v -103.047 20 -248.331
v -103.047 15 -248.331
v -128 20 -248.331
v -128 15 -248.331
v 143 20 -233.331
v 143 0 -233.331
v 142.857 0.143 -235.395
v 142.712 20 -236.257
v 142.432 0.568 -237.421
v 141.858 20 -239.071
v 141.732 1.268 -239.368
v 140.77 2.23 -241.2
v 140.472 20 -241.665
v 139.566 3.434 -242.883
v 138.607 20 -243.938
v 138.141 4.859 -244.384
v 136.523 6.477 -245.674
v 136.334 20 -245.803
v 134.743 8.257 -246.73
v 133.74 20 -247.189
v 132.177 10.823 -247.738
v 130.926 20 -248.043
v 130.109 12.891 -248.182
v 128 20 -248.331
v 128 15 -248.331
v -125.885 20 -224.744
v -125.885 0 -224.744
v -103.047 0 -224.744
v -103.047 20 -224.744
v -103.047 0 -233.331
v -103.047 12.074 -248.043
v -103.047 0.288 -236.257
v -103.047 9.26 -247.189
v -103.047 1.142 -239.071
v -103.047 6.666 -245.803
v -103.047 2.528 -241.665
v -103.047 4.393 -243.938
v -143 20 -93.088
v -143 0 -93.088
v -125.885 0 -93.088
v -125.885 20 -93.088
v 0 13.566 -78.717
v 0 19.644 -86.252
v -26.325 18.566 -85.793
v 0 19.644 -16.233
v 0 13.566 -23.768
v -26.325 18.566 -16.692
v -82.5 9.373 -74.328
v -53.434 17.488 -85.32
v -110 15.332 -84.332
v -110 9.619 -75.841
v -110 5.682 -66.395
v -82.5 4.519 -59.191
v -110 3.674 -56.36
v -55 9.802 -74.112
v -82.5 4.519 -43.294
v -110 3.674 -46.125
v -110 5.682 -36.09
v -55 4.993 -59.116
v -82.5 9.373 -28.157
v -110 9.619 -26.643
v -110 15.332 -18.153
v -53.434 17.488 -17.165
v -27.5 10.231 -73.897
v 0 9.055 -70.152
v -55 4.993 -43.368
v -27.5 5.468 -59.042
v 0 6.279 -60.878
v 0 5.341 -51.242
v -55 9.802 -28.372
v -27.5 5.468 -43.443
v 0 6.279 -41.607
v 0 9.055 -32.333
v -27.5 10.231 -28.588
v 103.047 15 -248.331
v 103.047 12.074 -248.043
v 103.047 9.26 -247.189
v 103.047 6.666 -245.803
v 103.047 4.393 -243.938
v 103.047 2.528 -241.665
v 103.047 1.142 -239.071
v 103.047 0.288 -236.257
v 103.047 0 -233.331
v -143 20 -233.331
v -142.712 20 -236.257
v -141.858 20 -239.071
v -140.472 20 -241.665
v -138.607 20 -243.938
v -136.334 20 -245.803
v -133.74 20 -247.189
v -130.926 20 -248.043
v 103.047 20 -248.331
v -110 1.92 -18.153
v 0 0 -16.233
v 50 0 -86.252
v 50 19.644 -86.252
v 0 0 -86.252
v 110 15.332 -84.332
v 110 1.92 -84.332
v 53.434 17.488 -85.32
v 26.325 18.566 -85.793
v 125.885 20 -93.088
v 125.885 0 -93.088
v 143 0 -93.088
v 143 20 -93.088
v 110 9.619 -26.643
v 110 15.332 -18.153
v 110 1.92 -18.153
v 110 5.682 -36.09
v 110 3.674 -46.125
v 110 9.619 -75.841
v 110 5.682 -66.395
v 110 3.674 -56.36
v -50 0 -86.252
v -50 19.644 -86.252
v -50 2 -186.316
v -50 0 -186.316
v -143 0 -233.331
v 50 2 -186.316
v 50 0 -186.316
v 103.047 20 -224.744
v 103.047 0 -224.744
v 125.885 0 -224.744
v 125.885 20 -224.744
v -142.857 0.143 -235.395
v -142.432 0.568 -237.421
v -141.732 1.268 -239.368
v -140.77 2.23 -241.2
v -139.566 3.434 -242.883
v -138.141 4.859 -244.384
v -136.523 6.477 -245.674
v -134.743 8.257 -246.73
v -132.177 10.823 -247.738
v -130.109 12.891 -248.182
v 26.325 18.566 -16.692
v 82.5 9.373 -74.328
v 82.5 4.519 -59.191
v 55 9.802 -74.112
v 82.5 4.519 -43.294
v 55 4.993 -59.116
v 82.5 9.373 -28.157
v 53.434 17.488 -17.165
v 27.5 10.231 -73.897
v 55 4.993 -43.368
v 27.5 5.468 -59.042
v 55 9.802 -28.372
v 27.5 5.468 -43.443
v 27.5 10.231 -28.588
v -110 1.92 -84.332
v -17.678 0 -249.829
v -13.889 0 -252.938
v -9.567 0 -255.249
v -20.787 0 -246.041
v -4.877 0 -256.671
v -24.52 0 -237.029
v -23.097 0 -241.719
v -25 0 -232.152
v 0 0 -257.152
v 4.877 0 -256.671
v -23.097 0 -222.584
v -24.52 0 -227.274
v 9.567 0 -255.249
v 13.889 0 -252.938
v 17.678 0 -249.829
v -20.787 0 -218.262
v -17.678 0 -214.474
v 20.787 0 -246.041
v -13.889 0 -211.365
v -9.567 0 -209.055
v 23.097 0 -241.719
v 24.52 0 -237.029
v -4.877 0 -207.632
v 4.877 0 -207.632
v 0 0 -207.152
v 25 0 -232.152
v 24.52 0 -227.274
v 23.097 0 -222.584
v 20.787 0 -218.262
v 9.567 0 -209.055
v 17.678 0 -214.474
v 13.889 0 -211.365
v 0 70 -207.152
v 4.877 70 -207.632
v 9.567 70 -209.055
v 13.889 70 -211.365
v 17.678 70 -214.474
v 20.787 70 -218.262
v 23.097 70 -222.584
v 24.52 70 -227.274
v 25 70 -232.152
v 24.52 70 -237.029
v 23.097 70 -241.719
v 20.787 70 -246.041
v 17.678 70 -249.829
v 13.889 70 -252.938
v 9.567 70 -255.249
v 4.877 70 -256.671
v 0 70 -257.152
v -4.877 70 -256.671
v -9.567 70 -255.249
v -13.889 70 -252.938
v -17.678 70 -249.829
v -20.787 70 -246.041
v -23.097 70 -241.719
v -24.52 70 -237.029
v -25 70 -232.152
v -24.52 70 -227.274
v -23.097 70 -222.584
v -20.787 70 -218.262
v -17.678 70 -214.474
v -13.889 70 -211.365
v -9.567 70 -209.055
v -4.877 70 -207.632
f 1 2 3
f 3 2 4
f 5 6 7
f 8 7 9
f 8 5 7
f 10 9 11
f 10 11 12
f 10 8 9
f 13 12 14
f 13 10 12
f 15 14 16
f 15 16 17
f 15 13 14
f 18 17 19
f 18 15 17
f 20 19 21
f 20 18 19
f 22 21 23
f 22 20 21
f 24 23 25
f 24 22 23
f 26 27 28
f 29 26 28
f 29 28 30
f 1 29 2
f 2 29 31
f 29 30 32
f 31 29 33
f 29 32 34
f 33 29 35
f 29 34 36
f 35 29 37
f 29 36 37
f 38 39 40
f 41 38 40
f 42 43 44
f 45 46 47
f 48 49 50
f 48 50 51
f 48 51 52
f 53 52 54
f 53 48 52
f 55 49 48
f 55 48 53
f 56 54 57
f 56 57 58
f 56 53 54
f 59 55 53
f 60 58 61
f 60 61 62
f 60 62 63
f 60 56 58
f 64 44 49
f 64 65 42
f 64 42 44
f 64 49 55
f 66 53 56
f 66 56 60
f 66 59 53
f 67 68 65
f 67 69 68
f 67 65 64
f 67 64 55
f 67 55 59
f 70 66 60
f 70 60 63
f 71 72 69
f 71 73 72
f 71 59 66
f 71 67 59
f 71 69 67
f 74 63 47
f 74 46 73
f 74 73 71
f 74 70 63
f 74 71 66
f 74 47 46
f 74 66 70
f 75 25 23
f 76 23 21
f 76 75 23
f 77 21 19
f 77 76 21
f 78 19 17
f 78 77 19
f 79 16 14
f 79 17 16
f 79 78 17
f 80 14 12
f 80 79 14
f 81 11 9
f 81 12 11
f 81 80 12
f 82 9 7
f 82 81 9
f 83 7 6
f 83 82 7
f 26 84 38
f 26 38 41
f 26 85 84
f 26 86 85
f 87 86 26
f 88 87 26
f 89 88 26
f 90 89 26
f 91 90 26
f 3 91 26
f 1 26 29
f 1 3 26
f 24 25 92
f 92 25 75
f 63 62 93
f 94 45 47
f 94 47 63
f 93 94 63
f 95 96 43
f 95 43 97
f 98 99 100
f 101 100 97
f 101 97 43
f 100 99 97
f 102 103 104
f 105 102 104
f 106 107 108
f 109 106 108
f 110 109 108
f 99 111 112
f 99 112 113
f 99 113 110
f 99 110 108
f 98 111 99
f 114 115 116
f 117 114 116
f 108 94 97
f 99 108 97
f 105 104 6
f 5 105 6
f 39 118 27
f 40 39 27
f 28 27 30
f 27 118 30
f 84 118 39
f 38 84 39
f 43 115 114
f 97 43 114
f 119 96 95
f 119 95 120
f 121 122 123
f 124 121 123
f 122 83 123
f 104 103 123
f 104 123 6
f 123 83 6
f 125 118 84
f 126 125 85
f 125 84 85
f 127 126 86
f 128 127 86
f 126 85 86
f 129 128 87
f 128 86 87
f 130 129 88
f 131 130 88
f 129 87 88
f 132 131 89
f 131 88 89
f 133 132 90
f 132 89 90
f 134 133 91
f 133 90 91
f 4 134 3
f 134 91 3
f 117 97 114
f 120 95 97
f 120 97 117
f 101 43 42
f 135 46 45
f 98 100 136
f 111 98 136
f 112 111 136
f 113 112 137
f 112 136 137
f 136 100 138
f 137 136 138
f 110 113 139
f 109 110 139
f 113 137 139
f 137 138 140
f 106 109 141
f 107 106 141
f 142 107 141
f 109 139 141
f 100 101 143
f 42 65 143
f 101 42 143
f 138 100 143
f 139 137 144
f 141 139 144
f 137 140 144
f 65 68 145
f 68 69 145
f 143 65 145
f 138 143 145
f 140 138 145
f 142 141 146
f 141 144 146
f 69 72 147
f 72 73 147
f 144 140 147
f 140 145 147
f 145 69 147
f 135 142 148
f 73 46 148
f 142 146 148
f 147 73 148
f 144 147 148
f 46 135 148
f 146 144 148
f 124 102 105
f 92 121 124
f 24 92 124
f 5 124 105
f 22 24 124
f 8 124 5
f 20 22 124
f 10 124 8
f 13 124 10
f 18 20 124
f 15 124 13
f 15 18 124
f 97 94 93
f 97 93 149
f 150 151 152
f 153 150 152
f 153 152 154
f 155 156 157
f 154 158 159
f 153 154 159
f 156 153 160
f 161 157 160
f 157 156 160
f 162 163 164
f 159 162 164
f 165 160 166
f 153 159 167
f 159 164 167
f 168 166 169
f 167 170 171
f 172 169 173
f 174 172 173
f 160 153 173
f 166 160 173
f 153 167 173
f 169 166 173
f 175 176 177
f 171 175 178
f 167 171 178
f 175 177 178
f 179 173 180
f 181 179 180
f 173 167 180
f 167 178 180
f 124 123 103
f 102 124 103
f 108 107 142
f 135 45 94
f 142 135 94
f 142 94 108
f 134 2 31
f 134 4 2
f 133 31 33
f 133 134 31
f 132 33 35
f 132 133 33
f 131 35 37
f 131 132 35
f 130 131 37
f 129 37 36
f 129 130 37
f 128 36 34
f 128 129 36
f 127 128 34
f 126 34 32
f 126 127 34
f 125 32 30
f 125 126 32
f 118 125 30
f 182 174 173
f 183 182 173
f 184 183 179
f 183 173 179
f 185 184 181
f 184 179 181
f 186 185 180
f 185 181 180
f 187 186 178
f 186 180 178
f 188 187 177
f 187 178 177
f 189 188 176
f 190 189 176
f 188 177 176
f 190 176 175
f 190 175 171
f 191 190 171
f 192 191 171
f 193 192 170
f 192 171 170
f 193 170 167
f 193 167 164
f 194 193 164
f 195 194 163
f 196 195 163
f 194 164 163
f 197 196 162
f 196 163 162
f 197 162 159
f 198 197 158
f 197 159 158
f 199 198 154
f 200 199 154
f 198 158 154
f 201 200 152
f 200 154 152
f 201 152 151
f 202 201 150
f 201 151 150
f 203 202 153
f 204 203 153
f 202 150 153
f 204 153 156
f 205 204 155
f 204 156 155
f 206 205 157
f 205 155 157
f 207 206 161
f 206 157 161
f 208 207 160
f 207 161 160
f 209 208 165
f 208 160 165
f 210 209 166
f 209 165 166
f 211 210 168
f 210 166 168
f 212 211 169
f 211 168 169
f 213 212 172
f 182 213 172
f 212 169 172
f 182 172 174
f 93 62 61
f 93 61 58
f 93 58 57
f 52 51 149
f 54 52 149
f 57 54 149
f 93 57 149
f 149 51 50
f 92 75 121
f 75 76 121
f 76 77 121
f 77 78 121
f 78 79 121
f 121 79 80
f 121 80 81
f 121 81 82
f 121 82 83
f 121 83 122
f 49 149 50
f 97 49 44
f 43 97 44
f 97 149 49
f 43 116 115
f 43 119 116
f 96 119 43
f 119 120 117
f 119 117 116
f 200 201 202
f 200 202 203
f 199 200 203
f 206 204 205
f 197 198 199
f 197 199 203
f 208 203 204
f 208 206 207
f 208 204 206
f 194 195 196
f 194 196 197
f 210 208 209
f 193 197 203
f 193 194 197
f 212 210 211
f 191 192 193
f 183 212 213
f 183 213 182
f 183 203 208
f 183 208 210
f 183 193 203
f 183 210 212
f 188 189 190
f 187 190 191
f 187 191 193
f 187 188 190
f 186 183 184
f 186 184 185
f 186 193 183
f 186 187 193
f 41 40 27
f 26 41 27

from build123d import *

# Parameters (mm, degrees)
BOSS_EXTRUDE1_DEPTH           = 20
BOSS_EXTRUDE1_2_DEPTH         = 20
FILLET1_R                     = 15
FILLET2_R                     = 15
BOSS_EXTRUDE2_DEPTH           = 50
SKETCH4_R                     = 25
BOSS_EXTRUDE3_DEPTH           = 70
BOSS_EXTRUDE4_DEPTH           = 110
BOSS_EXTRUDE4_DRAFT           = 1
BOSS_EXTRUDE4_OTHER_WAY_DEPTH = 110
BOSS_EXTRUDE4_OTHER_WAY_DRAFT = -1


with BuildPart() as part:
    # Sketch3 → Boss-Extrude1 (new body)
    with BuildSketch(Plane(origin=(0, 0, 0), x_dir=(1, 0, 0), z_dir=(0, 1, 0))):
        Polygon((-143, 248.331026124), (-143, 93.088162206), (-125.885057368, 93.088162206), (-125.885057368, 224.743736792), (-103.047296996, 224.743736792), (-103.047296996, 248.331026124), align=None)
    extrude(amount=BOSS_EXTRUDE1_DEPTH)

    # Fillet1
    fillet1_edges = [part.edges().sort_by_distance(p)[0] for p in [
        (-143, 10, -248.331026124),
        (-123.023648498, 0, -248.331026124),
    ]]
    fillet(fillet1_edges, radius=FILLET1_R)


with BuildPart() as body_2:
    # Sketch3 → Boss-Extrude1 2 (new body)
    with BuildSketch(Plane(origin=(0, 0, 0), x_dir=(1, 0, 0), z_dir=(0, 1, 0))):
        Polygon((125.885057368, 224.743736792), (125.885057368, 93.088162206), (143, 93.088162206), (143, 248.331026124), (103.047296996, 248.331026124), (103.047296996, 224.743736792), align=None)
    extrude(amount=BOSS_EXTRUDE1_2_DEPTH)

    # Fillet2
    fillet2_edges = [body_2.edges().sort_by_distance(p)[0] for p in [
        (143, 10, -248.331026124),
        (123.023648498, 0, -248.331026124),
    ]]
    fillet(fillet2_edges, radius=FILLET2_R)


with BuildPart() as body_3:
    # Sketch5 → Boss-Extrude2 (new, symmetric)
    with BuildSketch(Plane(origin=(0, 0, 0), x_dir=(0, 0, -1), z_dir=(1, 0, 0))):
        Polygon((86.252282078, 19.643991172), (86.252282078, 0), (186.316328437, 0), (186.316328437, 2), align=None)
    extrude(amount=BOSS_EXTRUDE2_DEPTH, both=True)


with BuildPart() as body_4:
    # Sketch4 → Boss-Extrude3 (new body)
    with BuildSketch(Plane(origin=(0, 0, 0), x_dir=(1, 0, 0), z_dir=(0, 1, 0))):
        with Locations(Location((0, 232.151552464, 0), (0, 0, 270))):
            Circle(SKETCH4_R)
    extrude(amount=BOSS_EXTRUDE3_DEPTH)


with BuildPart() as boss_extrude4_tool:
    # Sketch6 → Boss-Extrude4 (with draft: the straight prism first)
    with BuildSketch(Plane(origin=(0, 0, 0), x_dir=(0, 0, -1), z_dir=(1, 0, 0))):
        with BuildLine():
            Line((86.252282078, 0), (86.252282078, 19.643991172))
            ThreePointArc((86.252282078, 19.643991172), (51.24243699, 5.341480536), (16.232591902, 19.643991172))
            Line((16.232591902, 19.643991172), (16.232591902, 0))
            Line((16.232591902, 0), (86.252282078, 0))
        make_face()
    extrude(amount=BOSS_EXTRUDE4_DEPTH)
    # Boss-Extrude4: the draft: its side faces are tilted about the plane it starts from
    boss_extrude4_sides = [boss_extrude4_tool.faces().sort_by_distance(p)[0] for p in [
        (55, 9.821995586, -86.252282078),
        (55, 5.341480536, -51.24243699),
        (55, 9.821995586, -16.232591902),
        (55, 0, -51.24243699),
    ]]
    draft(boss_extrude4_sides, Plane(origin=(0, 0, 0), x_dir=(0, 0, -1), z_dir=(1, 0, 0)), BOSS_EXTRUDE4_DRAFT)


with BuildPart() as body_3_1:
    add(body_3.part)

    # Boss-Extrude4: add boss_extrude4_tool
    add(boss_extrude4_tool.part)


with BuildPart() as boss_extrude4_other_way_tool:
    # Sketch6 → Boss-Extrude4 other way (with draft: the straight prism first)
    with BuildSketch(Plane(origin=(0, 0, 0), x_dir=(0, 0, -1), z_dir=(1, 0, 0))):
        with BuildLine():
            Line((86.252282078, 0), (86.252282078, 19.643991172))
            ThreePointArc((86.252282078, 19.643991172), (51.24243699, 5.341480536), (16.232591902, 19.643991172))
            Line((16.232591902, 19.643991172), (16.232591902, 0))
            Line((16.232591902, 0), (86.252282078, 0))
        make_face()
    extrude(amount=-BOSS_EXTRUDE4_OTHER_WAY_DEPTH)
    # Boss-Extrude4 other way: the draft: its side faces are tilted about the plane it starts from
    boss_extrude4_other_way_sides = [boss_extrude4_other_way_tool.faces().sort_by_distance(p)[0] for p in [
        (-55, 9.821995586, -86.252282078),
        (-55, 5.341480536, -51.24243699),
        (-55, 9.821995586, -16.232591902),
        (-55, 0, -51.24243699),
    ]]
    draft(boss_extrude4_other_way_sides, Plane(origin=(0, 0, 0), x_dir=(0, 0, -1), z_dir=(1, 0, 0)), BOSS_EXTRUDE4_OTHER_WAY_DRAFT)


with BuildPart() as body_3_2:
    add(body_3_1.part)

    # Boss-Extrude4 other way: add boss_extrude4_other_way_tool
    add(boss_extrude4_other_way_tool.part)


solid = Compound([part.part, body_2.part, body_4.part, body_3_2.part])
